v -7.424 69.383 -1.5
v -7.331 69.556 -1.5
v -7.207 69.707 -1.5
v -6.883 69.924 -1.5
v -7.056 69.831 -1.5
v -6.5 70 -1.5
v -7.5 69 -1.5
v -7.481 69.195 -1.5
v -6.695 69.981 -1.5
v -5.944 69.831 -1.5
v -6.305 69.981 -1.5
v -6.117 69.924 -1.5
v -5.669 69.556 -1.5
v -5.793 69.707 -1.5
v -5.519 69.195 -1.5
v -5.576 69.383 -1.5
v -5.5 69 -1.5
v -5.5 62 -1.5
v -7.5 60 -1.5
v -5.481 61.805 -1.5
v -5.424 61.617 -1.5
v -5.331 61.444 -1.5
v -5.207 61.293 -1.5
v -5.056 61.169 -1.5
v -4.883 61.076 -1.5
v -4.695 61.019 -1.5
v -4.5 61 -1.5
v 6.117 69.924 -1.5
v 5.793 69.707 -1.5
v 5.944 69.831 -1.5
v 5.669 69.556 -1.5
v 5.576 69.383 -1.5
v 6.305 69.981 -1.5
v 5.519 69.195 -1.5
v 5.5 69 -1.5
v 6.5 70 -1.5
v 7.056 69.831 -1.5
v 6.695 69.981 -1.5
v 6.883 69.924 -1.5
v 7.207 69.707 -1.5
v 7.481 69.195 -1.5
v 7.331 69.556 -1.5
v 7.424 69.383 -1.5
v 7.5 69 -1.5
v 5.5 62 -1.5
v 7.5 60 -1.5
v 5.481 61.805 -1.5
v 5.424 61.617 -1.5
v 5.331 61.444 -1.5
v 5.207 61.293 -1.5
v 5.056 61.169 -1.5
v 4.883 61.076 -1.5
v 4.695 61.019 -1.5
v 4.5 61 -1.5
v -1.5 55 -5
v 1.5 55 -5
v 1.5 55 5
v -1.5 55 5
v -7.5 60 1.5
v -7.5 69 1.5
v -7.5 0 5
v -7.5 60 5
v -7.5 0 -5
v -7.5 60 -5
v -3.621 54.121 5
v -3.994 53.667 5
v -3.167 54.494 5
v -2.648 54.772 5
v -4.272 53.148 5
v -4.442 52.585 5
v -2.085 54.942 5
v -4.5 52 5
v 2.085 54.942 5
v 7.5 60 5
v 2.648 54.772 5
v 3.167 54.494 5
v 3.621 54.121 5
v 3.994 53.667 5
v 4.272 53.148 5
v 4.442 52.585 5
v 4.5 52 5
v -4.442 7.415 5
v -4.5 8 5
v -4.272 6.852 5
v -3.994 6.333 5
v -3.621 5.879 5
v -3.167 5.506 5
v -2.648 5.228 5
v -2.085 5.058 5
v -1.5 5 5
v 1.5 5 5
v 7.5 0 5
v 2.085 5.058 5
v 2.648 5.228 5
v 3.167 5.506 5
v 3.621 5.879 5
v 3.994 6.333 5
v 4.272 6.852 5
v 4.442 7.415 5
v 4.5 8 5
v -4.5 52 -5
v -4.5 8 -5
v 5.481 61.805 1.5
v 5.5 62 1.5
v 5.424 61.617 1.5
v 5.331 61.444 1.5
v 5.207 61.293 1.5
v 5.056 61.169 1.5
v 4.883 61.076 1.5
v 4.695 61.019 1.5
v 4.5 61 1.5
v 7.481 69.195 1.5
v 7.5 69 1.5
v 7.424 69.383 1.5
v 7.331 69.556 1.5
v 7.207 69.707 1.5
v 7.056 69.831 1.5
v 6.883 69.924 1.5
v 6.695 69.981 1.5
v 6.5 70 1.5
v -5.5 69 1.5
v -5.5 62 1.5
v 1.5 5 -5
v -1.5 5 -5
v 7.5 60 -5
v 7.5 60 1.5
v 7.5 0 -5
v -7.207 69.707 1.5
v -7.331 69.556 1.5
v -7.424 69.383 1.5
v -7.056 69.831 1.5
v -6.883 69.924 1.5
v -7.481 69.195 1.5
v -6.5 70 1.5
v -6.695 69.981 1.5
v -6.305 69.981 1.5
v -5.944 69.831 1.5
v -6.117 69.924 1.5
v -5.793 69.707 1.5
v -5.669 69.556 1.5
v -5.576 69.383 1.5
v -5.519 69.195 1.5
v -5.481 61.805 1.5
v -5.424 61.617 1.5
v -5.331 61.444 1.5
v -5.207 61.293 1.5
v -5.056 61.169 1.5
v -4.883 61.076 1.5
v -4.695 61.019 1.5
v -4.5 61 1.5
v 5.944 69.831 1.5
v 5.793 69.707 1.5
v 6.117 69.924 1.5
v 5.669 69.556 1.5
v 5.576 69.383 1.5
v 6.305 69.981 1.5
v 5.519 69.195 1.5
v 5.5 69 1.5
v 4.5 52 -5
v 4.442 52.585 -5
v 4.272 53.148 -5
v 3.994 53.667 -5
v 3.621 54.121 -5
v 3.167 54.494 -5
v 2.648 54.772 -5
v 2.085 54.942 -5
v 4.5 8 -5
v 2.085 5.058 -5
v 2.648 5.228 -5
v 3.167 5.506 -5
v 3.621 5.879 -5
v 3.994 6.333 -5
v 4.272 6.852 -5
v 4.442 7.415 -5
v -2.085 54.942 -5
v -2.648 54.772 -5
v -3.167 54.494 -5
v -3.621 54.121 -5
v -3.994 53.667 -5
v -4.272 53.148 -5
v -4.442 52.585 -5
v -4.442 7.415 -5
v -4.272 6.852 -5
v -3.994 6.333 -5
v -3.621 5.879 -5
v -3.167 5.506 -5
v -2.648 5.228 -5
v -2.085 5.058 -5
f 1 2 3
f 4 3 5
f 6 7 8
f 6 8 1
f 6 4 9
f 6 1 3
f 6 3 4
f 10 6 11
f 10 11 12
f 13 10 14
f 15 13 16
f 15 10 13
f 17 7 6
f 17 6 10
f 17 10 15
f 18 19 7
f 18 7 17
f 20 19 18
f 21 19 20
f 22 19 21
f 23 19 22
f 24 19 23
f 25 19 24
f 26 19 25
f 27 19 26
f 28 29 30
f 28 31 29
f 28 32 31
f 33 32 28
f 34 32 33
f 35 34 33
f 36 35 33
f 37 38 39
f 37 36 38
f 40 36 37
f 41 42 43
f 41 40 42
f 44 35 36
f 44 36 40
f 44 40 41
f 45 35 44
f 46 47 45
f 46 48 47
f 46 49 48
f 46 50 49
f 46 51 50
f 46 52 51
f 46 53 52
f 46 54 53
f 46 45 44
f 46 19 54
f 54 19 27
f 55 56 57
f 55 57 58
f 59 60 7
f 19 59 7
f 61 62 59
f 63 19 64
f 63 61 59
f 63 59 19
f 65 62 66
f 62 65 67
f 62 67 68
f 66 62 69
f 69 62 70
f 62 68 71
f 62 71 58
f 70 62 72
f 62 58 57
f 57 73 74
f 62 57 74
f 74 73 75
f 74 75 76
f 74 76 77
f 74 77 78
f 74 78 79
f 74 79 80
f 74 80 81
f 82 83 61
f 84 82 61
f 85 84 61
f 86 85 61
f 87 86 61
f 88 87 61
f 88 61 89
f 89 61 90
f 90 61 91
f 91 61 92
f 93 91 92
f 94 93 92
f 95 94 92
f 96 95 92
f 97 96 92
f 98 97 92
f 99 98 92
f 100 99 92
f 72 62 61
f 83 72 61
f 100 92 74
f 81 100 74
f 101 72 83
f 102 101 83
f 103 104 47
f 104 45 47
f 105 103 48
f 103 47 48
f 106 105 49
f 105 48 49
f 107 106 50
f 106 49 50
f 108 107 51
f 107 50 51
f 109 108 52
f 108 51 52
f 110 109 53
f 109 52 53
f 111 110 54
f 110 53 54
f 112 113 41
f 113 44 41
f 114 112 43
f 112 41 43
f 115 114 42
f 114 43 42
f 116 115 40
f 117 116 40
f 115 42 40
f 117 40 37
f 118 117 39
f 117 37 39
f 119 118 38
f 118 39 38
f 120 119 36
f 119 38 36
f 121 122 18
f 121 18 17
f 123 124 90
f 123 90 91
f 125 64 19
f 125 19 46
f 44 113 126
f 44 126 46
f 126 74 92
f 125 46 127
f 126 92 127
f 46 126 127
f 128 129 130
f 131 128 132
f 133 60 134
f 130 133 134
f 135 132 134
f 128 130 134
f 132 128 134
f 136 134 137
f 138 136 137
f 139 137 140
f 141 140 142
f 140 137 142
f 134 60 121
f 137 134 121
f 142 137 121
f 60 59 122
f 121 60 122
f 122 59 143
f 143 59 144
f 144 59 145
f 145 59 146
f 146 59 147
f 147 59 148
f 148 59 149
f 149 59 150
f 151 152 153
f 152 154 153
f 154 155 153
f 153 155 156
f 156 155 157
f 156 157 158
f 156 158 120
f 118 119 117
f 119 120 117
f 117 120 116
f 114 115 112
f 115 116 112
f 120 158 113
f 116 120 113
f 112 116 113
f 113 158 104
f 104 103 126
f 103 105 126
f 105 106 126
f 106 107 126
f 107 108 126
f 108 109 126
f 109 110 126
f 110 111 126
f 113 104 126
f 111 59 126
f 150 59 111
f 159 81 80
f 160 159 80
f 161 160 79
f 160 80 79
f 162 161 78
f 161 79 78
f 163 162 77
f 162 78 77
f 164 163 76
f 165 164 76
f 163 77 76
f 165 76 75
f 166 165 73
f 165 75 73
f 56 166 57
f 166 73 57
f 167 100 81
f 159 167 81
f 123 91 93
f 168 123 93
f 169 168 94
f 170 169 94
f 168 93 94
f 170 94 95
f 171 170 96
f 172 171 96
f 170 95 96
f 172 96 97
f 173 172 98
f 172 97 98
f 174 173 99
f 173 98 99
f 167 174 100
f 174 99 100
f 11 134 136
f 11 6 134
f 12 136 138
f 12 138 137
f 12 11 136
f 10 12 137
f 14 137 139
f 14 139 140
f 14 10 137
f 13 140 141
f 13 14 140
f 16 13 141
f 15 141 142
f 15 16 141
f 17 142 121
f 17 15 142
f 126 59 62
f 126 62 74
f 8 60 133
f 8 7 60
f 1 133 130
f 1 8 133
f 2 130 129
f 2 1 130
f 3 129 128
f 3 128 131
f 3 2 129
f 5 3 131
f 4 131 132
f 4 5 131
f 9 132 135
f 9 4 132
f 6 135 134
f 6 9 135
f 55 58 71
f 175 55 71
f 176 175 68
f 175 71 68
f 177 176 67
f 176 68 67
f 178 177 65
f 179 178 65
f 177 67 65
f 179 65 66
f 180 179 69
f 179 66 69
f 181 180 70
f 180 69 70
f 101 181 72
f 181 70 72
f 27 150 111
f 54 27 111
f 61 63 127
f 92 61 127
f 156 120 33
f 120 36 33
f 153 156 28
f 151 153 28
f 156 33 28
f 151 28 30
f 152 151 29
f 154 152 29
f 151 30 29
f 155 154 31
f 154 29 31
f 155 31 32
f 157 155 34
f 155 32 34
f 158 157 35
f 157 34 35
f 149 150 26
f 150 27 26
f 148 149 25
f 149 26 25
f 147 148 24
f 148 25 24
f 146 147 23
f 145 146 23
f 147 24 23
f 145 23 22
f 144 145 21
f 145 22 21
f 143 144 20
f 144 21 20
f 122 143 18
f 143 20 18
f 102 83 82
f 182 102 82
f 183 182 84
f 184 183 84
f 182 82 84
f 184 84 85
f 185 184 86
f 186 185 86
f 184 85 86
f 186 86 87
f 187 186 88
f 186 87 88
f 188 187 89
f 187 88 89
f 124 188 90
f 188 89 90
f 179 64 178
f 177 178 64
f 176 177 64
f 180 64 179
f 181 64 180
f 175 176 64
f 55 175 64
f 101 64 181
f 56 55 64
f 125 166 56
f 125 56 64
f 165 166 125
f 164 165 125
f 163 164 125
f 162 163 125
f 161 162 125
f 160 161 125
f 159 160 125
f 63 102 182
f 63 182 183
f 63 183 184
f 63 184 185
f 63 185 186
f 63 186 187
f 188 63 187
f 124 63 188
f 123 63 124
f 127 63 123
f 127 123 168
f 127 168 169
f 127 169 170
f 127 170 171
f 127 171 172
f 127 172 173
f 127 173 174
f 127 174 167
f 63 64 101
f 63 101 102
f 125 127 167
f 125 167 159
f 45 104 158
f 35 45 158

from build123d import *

# Parameters (mm, degrees)
SKETCH1_W           = 15
SKETCH1_H           = 10
BOSS_EXTRUDE1_DEPTH = 60
SKETCH2_W           = 15
SKETCH2_H           = 3
BOSS_EXTRUDE2_DEPTH = 10
SKETCH3_W           = 11
SKETCH3_H           = 18.791084145
CUT_EXTRUDE1_DEPTH  = 71.700070721
FILLET1_R           = 1
CUT_EXTRUDE2_DEPTH  = 72.107313267


with BuildPart() as part:
    # Sketch1 → Boss-Extrude1 (new body)
    with BuildSketch(Plane(origin=(0, 0, 0), x_dir=(1, 0, 0), z_dir=(0, 1, 0))):
        Rectangle(SKETCH1_W, SKETCH1_H)
    extrude(amount=BOSS_EXTRUDE1_DEPTH)

    # Sketch2 → Boss-Extrude2 (add)
    with BuildSketch(Plane(origin=(0, 60, 0), x_dir=(1, 0, 0), z_dir=(0, 1, 0))):
        Rectangle(SKETCH2_W, SKETCH2_H)
    extrude(amount=BOSS_EXTRUDE2_DEPTH)

    # Sketch3 → Cut-Extrude1 (cut, through all)
    with BuildSketch(Plane.XY.offset(1.5)):
        with Locations((0, 70.395542073)):
            Rectangle(SKETCH3_W, SKETCH3_H)
    extrude(amount=-CUT_EXTRUDE1_DEPTH, mode=Mode.SUBTRACT)

    # Fillet1
    fillet1_edges = [part.edges().sort_by_distance(p)[0] for p in [
        (-5.5, 70, 0),
        (5.5, 70, 0),
        (5.5, 61, 0),
        (-5.5, 61, 0),
        (-7.5, 70, 0),
        (7.5, 70, 0),
    ]]
    fillet(fillet1_edges, radius=FILLET1_R - 0.0001)  # a hair under: the kernel refuses the full size

    # Sketch4 → Cut-Extrude2 (cut, through all)
    with BuildSketch(Plane.XY.offset(5)):
        with BuildLine():
            Line((-1.5, 5), (1.5, 5))
            ThreePointArc((1.5, 5), (3.621320344, 5.878679656), (4.5, 8))
            Line((4.5, 8), (4.5, 52))
            ThreePointArc((4.5, 52), (3.621320344, 54.121320344), (1.5, 55))
            Line((1.5, 55), (-1.5, 55))
            ThreePointArc((-1.5, 55), (-3.621320344, 54.121320344), (-4.5, 52))
            Line((-4.5, 52), (-4.5, 8))
            ThreePointArc((-4.5, 8), (-3.621320344, 5.878679656), (-1.5, 5))
        make_face()
    extrude(amount=-CUT_EXTRUDE2_DEPTH, mode=Mode.SUBTRACT)


solid = part.part
